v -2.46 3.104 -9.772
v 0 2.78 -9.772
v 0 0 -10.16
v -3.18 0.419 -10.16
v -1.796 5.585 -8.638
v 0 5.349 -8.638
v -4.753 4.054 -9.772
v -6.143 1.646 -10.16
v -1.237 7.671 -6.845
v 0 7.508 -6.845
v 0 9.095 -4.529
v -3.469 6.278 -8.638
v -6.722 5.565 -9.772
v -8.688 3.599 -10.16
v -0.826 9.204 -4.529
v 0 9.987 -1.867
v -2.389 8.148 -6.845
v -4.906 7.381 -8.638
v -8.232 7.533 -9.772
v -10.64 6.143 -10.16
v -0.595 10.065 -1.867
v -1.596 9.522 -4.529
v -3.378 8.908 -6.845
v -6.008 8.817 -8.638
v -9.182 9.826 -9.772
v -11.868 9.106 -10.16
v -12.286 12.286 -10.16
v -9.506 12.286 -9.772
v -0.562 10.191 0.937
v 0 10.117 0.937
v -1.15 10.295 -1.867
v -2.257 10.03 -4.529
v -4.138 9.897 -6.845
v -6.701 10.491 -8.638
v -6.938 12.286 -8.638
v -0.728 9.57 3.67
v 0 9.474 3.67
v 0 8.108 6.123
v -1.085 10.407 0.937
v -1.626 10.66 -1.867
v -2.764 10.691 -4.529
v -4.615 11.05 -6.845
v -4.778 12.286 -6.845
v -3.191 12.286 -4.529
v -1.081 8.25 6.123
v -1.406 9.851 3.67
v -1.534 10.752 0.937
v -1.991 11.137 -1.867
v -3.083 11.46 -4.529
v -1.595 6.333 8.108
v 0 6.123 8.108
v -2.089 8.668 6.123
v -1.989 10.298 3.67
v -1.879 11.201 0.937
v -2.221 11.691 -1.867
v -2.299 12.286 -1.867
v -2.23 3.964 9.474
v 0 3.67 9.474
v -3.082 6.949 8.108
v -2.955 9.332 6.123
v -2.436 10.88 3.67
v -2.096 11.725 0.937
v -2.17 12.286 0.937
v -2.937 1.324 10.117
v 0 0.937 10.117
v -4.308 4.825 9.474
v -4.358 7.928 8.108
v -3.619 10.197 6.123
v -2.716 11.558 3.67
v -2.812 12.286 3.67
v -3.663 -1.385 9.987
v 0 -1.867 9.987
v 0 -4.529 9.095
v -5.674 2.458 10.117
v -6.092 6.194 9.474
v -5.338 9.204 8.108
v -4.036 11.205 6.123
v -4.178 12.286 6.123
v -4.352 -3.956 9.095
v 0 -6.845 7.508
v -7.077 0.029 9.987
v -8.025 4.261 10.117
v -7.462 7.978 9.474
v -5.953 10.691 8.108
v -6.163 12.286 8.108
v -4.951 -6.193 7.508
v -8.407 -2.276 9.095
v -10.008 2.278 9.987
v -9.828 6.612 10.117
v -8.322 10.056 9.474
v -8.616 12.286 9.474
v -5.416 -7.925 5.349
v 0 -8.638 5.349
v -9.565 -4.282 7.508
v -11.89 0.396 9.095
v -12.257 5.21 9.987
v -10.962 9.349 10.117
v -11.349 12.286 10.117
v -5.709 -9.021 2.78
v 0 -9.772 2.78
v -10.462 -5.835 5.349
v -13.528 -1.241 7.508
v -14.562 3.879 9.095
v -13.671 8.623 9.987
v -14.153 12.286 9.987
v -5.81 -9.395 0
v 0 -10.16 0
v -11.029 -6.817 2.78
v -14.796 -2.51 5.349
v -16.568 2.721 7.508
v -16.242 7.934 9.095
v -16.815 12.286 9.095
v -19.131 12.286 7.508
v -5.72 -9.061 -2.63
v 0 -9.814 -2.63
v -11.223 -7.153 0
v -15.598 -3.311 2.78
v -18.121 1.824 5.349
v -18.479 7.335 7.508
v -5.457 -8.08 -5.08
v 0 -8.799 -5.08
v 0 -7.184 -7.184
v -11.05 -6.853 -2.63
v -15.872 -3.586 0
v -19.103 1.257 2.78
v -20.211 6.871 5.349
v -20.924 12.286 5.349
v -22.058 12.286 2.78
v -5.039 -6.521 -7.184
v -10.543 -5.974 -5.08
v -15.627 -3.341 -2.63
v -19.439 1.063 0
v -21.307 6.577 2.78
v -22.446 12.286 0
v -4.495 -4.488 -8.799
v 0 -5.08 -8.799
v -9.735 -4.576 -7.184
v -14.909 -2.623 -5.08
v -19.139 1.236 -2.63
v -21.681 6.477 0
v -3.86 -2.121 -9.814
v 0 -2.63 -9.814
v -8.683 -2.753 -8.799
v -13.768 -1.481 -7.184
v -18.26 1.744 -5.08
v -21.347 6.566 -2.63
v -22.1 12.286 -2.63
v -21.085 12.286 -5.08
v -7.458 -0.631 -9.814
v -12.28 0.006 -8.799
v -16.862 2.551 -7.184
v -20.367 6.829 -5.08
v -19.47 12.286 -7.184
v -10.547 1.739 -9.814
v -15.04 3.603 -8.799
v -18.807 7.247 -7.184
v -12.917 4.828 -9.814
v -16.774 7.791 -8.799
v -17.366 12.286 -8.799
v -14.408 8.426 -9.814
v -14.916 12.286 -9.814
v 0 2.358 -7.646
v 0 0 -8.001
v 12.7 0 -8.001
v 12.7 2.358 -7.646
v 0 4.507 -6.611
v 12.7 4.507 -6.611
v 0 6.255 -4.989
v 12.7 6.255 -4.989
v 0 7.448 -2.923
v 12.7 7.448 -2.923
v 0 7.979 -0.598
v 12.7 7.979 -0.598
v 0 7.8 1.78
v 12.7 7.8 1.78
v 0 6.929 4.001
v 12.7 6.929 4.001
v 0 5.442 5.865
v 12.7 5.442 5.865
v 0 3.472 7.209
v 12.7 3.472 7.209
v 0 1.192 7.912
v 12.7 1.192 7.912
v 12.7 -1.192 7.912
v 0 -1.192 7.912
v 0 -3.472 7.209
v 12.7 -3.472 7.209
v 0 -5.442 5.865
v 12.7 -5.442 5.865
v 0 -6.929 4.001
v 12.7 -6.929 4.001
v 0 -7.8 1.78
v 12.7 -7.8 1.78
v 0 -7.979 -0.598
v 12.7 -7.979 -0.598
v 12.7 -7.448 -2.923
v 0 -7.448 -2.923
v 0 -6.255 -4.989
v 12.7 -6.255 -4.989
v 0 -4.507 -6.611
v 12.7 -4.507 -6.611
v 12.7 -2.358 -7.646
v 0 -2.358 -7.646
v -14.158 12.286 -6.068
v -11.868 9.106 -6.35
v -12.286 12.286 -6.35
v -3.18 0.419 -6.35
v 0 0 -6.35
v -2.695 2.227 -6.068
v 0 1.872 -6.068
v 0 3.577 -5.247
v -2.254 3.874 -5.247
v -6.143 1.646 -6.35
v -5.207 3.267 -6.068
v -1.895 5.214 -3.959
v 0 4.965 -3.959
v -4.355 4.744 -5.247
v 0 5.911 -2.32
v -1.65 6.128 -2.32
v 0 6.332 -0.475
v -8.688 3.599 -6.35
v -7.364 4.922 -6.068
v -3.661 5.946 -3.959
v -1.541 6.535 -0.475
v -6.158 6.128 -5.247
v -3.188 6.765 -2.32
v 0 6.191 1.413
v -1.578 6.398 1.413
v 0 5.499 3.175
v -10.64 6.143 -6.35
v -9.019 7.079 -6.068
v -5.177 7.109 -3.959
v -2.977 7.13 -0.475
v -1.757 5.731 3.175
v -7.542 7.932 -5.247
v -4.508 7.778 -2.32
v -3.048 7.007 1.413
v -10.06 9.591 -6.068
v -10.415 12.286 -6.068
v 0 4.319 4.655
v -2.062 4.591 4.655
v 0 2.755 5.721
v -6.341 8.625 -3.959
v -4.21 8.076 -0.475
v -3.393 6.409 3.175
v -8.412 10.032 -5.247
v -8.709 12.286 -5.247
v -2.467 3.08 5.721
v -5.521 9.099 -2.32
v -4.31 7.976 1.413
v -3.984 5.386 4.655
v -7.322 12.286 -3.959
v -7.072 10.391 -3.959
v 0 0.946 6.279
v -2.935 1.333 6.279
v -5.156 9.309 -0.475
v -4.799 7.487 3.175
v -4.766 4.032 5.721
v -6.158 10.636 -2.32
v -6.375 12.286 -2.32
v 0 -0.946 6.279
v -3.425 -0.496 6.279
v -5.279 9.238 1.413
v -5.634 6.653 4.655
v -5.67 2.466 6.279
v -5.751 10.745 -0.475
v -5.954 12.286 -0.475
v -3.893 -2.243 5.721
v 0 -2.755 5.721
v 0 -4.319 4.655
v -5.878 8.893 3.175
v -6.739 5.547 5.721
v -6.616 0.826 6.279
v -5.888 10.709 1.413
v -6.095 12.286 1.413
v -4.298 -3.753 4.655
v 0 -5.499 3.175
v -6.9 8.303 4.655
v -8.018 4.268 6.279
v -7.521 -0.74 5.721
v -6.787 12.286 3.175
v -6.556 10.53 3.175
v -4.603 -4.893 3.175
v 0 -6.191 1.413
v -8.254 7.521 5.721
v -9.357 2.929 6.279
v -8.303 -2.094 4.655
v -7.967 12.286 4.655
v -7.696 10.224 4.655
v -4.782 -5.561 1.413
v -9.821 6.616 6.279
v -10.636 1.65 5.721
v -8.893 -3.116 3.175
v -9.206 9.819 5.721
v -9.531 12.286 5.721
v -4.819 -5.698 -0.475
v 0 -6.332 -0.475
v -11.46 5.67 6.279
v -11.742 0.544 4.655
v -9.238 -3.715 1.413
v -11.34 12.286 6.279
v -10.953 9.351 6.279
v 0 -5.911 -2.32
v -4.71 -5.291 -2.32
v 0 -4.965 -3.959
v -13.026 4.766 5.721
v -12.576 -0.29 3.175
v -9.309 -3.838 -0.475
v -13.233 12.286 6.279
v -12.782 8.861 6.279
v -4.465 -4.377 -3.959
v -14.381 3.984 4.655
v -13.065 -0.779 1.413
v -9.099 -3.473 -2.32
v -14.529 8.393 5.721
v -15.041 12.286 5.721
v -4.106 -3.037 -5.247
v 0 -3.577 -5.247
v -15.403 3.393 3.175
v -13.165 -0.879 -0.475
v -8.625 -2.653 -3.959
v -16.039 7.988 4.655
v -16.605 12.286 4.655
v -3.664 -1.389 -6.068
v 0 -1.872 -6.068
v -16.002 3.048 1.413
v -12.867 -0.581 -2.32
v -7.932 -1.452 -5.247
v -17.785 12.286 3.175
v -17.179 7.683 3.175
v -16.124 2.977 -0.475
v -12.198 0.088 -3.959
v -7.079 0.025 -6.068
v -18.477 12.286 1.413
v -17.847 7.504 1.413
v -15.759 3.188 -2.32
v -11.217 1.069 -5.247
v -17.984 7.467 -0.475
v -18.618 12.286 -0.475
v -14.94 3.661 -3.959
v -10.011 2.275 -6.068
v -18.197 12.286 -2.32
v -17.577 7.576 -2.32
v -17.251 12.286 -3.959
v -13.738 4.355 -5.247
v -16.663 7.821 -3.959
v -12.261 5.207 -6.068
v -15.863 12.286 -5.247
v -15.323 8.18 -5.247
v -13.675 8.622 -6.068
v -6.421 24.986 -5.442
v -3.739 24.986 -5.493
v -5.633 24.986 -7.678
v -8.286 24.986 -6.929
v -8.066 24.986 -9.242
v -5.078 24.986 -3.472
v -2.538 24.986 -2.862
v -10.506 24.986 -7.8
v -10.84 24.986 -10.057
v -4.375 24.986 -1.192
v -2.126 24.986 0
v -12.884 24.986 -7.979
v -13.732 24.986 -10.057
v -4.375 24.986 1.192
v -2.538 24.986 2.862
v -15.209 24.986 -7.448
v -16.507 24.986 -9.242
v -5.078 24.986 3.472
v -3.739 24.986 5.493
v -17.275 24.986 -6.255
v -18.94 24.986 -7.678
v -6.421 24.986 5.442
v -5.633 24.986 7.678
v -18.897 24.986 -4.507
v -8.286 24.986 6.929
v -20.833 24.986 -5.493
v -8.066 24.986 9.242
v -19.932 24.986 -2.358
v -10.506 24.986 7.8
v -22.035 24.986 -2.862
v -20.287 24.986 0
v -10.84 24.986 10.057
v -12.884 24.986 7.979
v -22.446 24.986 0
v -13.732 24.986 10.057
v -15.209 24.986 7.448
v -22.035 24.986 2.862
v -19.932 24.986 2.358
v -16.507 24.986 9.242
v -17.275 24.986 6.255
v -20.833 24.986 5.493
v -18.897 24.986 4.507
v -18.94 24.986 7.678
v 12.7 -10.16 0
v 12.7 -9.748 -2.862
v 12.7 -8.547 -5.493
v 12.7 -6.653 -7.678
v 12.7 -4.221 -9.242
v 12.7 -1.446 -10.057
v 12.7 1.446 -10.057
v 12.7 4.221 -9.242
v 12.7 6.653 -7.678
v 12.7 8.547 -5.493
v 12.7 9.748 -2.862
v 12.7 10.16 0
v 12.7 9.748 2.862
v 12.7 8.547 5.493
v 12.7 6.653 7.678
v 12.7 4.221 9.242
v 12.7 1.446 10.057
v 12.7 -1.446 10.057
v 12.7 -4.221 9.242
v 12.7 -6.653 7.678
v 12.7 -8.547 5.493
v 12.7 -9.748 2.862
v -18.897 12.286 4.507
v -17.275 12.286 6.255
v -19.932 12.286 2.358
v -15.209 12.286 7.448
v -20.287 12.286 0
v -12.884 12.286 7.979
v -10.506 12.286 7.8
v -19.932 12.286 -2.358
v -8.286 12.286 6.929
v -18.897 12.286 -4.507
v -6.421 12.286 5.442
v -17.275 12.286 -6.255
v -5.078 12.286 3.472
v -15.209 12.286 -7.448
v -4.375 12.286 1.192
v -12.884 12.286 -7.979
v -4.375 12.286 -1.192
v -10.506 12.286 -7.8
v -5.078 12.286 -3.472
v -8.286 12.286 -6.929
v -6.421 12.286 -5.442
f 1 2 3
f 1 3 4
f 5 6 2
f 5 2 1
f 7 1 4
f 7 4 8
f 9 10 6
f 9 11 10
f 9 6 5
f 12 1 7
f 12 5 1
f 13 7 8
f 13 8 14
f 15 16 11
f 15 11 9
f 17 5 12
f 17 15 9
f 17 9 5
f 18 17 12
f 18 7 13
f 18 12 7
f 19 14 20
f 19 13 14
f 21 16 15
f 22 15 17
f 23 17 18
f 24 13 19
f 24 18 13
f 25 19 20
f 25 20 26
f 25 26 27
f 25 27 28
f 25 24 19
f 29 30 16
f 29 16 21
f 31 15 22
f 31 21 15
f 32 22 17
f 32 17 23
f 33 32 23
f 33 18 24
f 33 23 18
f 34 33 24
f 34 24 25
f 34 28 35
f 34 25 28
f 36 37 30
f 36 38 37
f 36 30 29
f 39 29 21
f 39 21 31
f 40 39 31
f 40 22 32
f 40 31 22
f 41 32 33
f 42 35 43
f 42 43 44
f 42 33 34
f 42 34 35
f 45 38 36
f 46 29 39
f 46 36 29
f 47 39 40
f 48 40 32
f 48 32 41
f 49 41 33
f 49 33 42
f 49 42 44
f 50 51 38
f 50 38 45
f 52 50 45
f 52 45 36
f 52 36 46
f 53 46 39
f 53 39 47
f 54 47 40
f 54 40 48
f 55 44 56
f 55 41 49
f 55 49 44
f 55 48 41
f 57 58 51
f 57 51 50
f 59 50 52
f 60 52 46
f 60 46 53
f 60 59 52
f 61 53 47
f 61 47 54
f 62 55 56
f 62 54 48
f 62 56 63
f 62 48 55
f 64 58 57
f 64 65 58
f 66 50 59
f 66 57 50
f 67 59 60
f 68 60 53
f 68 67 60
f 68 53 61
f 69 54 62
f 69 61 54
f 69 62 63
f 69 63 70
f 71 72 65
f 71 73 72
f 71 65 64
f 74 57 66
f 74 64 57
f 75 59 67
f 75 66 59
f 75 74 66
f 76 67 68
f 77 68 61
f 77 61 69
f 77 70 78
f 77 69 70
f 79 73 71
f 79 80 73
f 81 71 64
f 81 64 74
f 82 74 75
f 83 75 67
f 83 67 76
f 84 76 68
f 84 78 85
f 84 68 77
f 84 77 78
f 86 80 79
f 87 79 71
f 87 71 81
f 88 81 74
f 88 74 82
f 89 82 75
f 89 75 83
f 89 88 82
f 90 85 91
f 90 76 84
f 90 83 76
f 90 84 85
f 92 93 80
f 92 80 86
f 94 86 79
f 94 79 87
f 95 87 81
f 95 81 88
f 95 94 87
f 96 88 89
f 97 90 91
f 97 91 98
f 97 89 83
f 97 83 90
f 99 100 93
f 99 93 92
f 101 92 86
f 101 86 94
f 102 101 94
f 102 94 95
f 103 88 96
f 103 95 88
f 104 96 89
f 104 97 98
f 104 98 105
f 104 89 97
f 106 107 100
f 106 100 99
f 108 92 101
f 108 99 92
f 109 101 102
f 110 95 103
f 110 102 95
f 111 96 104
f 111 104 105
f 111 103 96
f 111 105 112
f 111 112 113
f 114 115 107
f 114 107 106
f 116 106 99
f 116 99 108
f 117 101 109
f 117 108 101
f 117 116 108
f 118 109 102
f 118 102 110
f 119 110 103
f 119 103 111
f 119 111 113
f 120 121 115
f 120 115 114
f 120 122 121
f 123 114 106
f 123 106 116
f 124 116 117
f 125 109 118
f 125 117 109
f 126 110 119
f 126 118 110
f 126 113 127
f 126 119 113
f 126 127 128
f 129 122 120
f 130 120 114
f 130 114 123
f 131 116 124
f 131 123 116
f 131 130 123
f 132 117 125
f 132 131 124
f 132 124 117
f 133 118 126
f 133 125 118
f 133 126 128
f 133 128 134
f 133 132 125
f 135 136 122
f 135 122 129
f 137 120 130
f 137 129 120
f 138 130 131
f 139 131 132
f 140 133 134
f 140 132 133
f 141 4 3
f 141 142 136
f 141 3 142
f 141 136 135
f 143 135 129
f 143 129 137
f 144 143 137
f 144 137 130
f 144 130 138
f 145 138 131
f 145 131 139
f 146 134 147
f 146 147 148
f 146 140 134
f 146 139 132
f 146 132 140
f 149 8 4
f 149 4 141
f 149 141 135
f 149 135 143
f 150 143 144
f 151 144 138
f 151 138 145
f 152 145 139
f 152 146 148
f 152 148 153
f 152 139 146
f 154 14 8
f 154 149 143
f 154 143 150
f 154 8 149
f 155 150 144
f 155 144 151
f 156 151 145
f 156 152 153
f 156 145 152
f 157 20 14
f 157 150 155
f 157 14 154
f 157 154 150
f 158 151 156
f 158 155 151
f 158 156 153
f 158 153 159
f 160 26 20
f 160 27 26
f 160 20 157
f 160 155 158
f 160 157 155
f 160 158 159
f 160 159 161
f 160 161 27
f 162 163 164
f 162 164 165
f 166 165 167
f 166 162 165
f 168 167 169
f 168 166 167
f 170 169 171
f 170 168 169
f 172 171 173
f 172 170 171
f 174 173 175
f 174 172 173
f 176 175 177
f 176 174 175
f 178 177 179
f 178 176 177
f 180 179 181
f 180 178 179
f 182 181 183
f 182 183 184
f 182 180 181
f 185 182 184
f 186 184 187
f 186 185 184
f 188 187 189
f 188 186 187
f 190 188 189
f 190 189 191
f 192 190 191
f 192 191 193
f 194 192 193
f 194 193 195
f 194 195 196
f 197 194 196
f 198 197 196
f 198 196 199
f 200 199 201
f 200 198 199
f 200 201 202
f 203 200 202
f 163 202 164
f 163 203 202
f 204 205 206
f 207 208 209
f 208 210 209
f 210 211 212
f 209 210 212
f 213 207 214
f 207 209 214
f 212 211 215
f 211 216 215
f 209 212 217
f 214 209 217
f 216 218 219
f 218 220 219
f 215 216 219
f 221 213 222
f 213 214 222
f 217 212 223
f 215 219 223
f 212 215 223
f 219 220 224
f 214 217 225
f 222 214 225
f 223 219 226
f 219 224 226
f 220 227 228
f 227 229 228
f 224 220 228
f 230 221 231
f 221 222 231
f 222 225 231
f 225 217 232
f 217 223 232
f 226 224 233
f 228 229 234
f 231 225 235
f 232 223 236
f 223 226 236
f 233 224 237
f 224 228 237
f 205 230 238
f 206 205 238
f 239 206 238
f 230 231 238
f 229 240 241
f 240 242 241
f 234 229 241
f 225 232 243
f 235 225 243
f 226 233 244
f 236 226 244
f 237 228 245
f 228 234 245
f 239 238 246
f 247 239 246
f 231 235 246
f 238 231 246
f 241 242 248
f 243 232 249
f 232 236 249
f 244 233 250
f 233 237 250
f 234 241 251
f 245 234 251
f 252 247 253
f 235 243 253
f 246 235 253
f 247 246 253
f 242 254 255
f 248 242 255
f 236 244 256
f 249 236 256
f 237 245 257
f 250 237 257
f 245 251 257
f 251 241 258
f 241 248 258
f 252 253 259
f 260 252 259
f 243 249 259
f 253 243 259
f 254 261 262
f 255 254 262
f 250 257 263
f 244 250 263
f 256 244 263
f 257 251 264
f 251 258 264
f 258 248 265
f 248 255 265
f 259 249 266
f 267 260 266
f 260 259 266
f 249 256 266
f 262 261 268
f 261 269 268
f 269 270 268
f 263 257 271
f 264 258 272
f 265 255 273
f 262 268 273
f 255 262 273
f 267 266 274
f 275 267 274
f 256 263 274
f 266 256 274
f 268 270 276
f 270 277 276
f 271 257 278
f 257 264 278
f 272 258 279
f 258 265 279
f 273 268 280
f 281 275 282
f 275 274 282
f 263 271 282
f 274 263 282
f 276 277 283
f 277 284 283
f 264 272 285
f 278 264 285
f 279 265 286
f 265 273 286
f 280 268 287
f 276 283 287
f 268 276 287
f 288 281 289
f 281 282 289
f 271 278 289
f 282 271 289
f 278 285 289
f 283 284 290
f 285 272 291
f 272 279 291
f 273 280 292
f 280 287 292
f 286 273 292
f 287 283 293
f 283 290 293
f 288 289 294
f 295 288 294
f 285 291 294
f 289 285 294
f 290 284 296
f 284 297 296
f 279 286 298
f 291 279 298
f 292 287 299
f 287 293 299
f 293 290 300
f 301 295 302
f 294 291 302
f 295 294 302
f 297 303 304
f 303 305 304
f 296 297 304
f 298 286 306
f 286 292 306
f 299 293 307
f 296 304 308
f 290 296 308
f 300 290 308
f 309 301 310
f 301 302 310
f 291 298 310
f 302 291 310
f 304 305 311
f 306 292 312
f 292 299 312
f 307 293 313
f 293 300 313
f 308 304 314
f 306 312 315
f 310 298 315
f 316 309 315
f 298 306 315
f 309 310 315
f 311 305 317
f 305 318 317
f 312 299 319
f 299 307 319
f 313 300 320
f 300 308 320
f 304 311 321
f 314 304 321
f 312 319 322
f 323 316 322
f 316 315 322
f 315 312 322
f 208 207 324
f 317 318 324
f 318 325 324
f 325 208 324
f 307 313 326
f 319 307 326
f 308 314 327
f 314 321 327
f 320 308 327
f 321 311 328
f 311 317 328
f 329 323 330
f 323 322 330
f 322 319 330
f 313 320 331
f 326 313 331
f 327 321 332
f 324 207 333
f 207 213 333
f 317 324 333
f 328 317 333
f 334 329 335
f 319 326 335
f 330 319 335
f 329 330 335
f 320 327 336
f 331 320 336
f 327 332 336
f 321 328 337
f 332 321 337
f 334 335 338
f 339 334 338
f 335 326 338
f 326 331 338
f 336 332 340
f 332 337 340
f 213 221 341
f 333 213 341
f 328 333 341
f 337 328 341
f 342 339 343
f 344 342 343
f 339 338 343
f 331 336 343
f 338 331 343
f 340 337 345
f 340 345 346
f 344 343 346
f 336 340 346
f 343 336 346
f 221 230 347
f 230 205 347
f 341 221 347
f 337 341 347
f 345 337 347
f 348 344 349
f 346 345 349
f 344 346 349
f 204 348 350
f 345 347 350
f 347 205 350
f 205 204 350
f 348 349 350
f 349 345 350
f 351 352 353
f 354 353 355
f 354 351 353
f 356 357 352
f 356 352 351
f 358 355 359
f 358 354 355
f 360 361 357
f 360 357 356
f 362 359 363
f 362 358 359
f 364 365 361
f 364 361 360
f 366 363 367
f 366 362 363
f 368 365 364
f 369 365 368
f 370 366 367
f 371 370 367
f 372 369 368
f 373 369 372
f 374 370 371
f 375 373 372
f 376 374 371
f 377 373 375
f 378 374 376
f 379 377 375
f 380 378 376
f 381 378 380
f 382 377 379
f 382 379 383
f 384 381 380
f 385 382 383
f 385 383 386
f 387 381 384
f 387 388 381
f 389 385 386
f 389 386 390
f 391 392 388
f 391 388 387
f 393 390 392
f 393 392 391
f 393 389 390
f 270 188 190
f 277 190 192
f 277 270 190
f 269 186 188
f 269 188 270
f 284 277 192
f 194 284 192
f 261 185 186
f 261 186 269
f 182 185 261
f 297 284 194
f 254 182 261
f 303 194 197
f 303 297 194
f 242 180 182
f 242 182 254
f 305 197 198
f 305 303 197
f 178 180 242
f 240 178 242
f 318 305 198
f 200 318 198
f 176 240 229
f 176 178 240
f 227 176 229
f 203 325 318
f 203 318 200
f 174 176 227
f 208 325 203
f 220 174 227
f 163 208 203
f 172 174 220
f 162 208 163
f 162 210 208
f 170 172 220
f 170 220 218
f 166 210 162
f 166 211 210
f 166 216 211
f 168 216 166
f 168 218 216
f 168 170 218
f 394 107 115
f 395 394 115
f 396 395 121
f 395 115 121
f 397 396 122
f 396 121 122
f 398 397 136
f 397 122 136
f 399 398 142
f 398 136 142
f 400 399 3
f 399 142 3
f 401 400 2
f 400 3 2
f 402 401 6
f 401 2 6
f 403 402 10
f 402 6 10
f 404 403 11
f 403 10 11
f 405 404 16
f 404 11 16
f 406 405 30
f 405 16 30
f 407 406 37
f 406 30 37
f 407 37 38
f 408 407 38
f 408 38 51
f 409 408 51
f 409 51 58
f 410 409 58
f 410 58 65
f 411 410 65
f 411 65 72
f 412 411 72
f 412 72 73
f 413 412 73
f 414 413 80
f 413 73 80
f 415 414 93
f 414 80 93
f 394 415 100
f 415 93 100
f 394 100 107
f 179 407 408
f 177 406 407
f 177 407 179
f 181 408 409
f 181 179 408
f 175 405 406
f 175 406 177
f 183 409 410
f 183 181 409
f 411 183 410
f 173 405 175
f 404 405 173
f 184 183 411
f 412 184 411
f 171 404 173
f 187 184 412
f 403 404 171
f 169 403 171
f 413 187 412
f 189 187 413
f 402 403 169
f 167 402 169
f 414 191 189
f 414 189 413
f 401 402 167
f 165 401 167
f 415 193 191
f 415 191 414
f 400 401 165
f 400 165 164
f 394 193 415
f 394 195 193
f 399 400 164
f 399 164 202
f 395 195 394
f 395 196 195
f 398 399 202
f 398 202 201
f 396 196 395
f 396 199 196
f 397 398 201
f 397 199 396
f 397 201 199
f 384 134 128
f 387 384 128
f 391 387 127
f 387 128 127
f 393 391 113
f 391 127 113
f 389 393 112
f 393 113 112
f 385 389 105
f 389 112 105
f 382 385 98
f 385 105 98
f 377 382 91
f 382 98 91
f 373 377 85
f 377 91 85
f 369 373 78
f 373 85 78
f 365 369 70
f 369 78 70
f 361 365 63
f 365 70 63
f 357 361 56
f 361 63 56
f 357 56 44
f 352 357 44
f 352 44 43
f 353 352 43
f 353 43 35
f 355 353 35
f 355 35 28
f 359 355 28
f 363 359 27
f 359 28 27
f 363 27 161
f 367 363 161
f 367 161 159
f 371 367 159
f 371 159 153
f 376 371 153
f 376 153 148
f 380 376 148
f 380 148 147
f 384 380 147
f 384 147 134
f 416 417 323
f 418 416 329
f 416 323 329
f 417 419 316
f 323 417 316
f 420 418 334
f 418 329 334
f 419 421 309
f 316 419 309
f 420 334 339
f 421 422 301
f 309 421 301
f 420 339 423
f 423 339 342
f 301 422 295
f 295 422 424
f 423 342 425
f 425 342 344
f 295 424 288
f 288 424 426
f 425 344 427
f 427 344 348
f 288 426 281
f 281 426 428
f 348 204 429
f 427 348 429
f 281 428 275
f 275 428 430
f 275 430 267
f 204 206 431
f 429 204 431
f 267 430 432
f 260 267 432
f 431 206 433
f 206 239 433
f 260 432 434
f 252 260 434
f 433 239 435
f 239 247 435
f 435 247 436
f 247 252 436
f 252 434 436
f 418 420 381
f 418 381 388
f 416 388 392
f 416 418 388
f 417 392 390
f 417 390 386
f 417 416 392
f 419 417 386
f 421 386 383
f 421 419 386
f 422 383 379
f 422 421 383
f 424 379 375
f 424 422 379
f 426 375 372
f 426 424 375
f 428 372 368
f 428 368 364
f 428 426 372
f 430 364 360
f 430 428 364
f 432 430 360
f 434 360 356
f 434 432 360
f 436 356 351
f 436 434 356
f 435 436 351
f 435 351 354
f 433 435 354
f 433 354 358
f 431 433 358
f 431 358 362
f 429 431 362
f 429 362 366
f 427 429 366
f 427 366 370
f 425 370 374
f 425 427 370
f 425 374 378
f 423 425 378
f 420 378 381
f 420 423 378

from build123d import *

# Parameters (mm, degrees)
SKETCH1_R           = 10.16
SKETCH1_R_2         = 6.35
REVOLVE1_ANGLE      = 90
SKETCH2_R           = 10.16
SKETCH2_R_2         = 8.001
BOSS_EXTRUDE1_DEPTH = 12.7
SKETCH3_R           = 10.16
SKETCH3_R_2         = 8.001
BOSS_EXTRUDE2_DEPTH = 12.7


with BuildPart() as part:
    # Sketch1 → Revolve1 (revolve)
    with BuildSketch(Plane(origin=(0, 0, 0), x_dir=(0, 0, -1), z_dir=(1, 0, 0))):
        Circle(SKETCH1_R)
        Circle(SKETCH1_R_2, mode=Mode.SUBTRACT)
    revolve(axis=Axis((0, 12.286198988, 1000.032631209), (0, 0, -1)), revolution_arc=REVOLVE1_ANGLE)

    # Sketch2 → Boss-Extrude1 (add)
    with BuildSketch(Plane(origin=(0, 12.286198988, 0), x_dir=(1, 0, 0), z_dir=(0, 1, 0))):
        with Locations(Location((-12.286198988, 0, 0), (0, 0, 180))):
            Circle(SKETCH2_R)
        with Locations(Location((-12.286198988, 0, 0), (0, 0, 180))):
            Circle(SKETCH2_R_2, mode=Mode.SUBTRACT)
    extrude(amount=BOSS_EXTRUDE1_DEPTH)

    # Sketch3 → Boss-Extrude2 (add)
    with BuildSketch(Plane(origin=(0, 0, 0), x_dir=(0, 0, -1), z_dir=(1, 0, 0))):
        with Locations(Location((0, 0, 0), (0, 0, 270))):
            Circle(SKETCH3_R)
        Circle(SKETCH3_R_2, mode=Mode.SUBTRACT)
    extrude(amount=BOSS_EXTRUDE2_DEPTH)


solid = part.part
